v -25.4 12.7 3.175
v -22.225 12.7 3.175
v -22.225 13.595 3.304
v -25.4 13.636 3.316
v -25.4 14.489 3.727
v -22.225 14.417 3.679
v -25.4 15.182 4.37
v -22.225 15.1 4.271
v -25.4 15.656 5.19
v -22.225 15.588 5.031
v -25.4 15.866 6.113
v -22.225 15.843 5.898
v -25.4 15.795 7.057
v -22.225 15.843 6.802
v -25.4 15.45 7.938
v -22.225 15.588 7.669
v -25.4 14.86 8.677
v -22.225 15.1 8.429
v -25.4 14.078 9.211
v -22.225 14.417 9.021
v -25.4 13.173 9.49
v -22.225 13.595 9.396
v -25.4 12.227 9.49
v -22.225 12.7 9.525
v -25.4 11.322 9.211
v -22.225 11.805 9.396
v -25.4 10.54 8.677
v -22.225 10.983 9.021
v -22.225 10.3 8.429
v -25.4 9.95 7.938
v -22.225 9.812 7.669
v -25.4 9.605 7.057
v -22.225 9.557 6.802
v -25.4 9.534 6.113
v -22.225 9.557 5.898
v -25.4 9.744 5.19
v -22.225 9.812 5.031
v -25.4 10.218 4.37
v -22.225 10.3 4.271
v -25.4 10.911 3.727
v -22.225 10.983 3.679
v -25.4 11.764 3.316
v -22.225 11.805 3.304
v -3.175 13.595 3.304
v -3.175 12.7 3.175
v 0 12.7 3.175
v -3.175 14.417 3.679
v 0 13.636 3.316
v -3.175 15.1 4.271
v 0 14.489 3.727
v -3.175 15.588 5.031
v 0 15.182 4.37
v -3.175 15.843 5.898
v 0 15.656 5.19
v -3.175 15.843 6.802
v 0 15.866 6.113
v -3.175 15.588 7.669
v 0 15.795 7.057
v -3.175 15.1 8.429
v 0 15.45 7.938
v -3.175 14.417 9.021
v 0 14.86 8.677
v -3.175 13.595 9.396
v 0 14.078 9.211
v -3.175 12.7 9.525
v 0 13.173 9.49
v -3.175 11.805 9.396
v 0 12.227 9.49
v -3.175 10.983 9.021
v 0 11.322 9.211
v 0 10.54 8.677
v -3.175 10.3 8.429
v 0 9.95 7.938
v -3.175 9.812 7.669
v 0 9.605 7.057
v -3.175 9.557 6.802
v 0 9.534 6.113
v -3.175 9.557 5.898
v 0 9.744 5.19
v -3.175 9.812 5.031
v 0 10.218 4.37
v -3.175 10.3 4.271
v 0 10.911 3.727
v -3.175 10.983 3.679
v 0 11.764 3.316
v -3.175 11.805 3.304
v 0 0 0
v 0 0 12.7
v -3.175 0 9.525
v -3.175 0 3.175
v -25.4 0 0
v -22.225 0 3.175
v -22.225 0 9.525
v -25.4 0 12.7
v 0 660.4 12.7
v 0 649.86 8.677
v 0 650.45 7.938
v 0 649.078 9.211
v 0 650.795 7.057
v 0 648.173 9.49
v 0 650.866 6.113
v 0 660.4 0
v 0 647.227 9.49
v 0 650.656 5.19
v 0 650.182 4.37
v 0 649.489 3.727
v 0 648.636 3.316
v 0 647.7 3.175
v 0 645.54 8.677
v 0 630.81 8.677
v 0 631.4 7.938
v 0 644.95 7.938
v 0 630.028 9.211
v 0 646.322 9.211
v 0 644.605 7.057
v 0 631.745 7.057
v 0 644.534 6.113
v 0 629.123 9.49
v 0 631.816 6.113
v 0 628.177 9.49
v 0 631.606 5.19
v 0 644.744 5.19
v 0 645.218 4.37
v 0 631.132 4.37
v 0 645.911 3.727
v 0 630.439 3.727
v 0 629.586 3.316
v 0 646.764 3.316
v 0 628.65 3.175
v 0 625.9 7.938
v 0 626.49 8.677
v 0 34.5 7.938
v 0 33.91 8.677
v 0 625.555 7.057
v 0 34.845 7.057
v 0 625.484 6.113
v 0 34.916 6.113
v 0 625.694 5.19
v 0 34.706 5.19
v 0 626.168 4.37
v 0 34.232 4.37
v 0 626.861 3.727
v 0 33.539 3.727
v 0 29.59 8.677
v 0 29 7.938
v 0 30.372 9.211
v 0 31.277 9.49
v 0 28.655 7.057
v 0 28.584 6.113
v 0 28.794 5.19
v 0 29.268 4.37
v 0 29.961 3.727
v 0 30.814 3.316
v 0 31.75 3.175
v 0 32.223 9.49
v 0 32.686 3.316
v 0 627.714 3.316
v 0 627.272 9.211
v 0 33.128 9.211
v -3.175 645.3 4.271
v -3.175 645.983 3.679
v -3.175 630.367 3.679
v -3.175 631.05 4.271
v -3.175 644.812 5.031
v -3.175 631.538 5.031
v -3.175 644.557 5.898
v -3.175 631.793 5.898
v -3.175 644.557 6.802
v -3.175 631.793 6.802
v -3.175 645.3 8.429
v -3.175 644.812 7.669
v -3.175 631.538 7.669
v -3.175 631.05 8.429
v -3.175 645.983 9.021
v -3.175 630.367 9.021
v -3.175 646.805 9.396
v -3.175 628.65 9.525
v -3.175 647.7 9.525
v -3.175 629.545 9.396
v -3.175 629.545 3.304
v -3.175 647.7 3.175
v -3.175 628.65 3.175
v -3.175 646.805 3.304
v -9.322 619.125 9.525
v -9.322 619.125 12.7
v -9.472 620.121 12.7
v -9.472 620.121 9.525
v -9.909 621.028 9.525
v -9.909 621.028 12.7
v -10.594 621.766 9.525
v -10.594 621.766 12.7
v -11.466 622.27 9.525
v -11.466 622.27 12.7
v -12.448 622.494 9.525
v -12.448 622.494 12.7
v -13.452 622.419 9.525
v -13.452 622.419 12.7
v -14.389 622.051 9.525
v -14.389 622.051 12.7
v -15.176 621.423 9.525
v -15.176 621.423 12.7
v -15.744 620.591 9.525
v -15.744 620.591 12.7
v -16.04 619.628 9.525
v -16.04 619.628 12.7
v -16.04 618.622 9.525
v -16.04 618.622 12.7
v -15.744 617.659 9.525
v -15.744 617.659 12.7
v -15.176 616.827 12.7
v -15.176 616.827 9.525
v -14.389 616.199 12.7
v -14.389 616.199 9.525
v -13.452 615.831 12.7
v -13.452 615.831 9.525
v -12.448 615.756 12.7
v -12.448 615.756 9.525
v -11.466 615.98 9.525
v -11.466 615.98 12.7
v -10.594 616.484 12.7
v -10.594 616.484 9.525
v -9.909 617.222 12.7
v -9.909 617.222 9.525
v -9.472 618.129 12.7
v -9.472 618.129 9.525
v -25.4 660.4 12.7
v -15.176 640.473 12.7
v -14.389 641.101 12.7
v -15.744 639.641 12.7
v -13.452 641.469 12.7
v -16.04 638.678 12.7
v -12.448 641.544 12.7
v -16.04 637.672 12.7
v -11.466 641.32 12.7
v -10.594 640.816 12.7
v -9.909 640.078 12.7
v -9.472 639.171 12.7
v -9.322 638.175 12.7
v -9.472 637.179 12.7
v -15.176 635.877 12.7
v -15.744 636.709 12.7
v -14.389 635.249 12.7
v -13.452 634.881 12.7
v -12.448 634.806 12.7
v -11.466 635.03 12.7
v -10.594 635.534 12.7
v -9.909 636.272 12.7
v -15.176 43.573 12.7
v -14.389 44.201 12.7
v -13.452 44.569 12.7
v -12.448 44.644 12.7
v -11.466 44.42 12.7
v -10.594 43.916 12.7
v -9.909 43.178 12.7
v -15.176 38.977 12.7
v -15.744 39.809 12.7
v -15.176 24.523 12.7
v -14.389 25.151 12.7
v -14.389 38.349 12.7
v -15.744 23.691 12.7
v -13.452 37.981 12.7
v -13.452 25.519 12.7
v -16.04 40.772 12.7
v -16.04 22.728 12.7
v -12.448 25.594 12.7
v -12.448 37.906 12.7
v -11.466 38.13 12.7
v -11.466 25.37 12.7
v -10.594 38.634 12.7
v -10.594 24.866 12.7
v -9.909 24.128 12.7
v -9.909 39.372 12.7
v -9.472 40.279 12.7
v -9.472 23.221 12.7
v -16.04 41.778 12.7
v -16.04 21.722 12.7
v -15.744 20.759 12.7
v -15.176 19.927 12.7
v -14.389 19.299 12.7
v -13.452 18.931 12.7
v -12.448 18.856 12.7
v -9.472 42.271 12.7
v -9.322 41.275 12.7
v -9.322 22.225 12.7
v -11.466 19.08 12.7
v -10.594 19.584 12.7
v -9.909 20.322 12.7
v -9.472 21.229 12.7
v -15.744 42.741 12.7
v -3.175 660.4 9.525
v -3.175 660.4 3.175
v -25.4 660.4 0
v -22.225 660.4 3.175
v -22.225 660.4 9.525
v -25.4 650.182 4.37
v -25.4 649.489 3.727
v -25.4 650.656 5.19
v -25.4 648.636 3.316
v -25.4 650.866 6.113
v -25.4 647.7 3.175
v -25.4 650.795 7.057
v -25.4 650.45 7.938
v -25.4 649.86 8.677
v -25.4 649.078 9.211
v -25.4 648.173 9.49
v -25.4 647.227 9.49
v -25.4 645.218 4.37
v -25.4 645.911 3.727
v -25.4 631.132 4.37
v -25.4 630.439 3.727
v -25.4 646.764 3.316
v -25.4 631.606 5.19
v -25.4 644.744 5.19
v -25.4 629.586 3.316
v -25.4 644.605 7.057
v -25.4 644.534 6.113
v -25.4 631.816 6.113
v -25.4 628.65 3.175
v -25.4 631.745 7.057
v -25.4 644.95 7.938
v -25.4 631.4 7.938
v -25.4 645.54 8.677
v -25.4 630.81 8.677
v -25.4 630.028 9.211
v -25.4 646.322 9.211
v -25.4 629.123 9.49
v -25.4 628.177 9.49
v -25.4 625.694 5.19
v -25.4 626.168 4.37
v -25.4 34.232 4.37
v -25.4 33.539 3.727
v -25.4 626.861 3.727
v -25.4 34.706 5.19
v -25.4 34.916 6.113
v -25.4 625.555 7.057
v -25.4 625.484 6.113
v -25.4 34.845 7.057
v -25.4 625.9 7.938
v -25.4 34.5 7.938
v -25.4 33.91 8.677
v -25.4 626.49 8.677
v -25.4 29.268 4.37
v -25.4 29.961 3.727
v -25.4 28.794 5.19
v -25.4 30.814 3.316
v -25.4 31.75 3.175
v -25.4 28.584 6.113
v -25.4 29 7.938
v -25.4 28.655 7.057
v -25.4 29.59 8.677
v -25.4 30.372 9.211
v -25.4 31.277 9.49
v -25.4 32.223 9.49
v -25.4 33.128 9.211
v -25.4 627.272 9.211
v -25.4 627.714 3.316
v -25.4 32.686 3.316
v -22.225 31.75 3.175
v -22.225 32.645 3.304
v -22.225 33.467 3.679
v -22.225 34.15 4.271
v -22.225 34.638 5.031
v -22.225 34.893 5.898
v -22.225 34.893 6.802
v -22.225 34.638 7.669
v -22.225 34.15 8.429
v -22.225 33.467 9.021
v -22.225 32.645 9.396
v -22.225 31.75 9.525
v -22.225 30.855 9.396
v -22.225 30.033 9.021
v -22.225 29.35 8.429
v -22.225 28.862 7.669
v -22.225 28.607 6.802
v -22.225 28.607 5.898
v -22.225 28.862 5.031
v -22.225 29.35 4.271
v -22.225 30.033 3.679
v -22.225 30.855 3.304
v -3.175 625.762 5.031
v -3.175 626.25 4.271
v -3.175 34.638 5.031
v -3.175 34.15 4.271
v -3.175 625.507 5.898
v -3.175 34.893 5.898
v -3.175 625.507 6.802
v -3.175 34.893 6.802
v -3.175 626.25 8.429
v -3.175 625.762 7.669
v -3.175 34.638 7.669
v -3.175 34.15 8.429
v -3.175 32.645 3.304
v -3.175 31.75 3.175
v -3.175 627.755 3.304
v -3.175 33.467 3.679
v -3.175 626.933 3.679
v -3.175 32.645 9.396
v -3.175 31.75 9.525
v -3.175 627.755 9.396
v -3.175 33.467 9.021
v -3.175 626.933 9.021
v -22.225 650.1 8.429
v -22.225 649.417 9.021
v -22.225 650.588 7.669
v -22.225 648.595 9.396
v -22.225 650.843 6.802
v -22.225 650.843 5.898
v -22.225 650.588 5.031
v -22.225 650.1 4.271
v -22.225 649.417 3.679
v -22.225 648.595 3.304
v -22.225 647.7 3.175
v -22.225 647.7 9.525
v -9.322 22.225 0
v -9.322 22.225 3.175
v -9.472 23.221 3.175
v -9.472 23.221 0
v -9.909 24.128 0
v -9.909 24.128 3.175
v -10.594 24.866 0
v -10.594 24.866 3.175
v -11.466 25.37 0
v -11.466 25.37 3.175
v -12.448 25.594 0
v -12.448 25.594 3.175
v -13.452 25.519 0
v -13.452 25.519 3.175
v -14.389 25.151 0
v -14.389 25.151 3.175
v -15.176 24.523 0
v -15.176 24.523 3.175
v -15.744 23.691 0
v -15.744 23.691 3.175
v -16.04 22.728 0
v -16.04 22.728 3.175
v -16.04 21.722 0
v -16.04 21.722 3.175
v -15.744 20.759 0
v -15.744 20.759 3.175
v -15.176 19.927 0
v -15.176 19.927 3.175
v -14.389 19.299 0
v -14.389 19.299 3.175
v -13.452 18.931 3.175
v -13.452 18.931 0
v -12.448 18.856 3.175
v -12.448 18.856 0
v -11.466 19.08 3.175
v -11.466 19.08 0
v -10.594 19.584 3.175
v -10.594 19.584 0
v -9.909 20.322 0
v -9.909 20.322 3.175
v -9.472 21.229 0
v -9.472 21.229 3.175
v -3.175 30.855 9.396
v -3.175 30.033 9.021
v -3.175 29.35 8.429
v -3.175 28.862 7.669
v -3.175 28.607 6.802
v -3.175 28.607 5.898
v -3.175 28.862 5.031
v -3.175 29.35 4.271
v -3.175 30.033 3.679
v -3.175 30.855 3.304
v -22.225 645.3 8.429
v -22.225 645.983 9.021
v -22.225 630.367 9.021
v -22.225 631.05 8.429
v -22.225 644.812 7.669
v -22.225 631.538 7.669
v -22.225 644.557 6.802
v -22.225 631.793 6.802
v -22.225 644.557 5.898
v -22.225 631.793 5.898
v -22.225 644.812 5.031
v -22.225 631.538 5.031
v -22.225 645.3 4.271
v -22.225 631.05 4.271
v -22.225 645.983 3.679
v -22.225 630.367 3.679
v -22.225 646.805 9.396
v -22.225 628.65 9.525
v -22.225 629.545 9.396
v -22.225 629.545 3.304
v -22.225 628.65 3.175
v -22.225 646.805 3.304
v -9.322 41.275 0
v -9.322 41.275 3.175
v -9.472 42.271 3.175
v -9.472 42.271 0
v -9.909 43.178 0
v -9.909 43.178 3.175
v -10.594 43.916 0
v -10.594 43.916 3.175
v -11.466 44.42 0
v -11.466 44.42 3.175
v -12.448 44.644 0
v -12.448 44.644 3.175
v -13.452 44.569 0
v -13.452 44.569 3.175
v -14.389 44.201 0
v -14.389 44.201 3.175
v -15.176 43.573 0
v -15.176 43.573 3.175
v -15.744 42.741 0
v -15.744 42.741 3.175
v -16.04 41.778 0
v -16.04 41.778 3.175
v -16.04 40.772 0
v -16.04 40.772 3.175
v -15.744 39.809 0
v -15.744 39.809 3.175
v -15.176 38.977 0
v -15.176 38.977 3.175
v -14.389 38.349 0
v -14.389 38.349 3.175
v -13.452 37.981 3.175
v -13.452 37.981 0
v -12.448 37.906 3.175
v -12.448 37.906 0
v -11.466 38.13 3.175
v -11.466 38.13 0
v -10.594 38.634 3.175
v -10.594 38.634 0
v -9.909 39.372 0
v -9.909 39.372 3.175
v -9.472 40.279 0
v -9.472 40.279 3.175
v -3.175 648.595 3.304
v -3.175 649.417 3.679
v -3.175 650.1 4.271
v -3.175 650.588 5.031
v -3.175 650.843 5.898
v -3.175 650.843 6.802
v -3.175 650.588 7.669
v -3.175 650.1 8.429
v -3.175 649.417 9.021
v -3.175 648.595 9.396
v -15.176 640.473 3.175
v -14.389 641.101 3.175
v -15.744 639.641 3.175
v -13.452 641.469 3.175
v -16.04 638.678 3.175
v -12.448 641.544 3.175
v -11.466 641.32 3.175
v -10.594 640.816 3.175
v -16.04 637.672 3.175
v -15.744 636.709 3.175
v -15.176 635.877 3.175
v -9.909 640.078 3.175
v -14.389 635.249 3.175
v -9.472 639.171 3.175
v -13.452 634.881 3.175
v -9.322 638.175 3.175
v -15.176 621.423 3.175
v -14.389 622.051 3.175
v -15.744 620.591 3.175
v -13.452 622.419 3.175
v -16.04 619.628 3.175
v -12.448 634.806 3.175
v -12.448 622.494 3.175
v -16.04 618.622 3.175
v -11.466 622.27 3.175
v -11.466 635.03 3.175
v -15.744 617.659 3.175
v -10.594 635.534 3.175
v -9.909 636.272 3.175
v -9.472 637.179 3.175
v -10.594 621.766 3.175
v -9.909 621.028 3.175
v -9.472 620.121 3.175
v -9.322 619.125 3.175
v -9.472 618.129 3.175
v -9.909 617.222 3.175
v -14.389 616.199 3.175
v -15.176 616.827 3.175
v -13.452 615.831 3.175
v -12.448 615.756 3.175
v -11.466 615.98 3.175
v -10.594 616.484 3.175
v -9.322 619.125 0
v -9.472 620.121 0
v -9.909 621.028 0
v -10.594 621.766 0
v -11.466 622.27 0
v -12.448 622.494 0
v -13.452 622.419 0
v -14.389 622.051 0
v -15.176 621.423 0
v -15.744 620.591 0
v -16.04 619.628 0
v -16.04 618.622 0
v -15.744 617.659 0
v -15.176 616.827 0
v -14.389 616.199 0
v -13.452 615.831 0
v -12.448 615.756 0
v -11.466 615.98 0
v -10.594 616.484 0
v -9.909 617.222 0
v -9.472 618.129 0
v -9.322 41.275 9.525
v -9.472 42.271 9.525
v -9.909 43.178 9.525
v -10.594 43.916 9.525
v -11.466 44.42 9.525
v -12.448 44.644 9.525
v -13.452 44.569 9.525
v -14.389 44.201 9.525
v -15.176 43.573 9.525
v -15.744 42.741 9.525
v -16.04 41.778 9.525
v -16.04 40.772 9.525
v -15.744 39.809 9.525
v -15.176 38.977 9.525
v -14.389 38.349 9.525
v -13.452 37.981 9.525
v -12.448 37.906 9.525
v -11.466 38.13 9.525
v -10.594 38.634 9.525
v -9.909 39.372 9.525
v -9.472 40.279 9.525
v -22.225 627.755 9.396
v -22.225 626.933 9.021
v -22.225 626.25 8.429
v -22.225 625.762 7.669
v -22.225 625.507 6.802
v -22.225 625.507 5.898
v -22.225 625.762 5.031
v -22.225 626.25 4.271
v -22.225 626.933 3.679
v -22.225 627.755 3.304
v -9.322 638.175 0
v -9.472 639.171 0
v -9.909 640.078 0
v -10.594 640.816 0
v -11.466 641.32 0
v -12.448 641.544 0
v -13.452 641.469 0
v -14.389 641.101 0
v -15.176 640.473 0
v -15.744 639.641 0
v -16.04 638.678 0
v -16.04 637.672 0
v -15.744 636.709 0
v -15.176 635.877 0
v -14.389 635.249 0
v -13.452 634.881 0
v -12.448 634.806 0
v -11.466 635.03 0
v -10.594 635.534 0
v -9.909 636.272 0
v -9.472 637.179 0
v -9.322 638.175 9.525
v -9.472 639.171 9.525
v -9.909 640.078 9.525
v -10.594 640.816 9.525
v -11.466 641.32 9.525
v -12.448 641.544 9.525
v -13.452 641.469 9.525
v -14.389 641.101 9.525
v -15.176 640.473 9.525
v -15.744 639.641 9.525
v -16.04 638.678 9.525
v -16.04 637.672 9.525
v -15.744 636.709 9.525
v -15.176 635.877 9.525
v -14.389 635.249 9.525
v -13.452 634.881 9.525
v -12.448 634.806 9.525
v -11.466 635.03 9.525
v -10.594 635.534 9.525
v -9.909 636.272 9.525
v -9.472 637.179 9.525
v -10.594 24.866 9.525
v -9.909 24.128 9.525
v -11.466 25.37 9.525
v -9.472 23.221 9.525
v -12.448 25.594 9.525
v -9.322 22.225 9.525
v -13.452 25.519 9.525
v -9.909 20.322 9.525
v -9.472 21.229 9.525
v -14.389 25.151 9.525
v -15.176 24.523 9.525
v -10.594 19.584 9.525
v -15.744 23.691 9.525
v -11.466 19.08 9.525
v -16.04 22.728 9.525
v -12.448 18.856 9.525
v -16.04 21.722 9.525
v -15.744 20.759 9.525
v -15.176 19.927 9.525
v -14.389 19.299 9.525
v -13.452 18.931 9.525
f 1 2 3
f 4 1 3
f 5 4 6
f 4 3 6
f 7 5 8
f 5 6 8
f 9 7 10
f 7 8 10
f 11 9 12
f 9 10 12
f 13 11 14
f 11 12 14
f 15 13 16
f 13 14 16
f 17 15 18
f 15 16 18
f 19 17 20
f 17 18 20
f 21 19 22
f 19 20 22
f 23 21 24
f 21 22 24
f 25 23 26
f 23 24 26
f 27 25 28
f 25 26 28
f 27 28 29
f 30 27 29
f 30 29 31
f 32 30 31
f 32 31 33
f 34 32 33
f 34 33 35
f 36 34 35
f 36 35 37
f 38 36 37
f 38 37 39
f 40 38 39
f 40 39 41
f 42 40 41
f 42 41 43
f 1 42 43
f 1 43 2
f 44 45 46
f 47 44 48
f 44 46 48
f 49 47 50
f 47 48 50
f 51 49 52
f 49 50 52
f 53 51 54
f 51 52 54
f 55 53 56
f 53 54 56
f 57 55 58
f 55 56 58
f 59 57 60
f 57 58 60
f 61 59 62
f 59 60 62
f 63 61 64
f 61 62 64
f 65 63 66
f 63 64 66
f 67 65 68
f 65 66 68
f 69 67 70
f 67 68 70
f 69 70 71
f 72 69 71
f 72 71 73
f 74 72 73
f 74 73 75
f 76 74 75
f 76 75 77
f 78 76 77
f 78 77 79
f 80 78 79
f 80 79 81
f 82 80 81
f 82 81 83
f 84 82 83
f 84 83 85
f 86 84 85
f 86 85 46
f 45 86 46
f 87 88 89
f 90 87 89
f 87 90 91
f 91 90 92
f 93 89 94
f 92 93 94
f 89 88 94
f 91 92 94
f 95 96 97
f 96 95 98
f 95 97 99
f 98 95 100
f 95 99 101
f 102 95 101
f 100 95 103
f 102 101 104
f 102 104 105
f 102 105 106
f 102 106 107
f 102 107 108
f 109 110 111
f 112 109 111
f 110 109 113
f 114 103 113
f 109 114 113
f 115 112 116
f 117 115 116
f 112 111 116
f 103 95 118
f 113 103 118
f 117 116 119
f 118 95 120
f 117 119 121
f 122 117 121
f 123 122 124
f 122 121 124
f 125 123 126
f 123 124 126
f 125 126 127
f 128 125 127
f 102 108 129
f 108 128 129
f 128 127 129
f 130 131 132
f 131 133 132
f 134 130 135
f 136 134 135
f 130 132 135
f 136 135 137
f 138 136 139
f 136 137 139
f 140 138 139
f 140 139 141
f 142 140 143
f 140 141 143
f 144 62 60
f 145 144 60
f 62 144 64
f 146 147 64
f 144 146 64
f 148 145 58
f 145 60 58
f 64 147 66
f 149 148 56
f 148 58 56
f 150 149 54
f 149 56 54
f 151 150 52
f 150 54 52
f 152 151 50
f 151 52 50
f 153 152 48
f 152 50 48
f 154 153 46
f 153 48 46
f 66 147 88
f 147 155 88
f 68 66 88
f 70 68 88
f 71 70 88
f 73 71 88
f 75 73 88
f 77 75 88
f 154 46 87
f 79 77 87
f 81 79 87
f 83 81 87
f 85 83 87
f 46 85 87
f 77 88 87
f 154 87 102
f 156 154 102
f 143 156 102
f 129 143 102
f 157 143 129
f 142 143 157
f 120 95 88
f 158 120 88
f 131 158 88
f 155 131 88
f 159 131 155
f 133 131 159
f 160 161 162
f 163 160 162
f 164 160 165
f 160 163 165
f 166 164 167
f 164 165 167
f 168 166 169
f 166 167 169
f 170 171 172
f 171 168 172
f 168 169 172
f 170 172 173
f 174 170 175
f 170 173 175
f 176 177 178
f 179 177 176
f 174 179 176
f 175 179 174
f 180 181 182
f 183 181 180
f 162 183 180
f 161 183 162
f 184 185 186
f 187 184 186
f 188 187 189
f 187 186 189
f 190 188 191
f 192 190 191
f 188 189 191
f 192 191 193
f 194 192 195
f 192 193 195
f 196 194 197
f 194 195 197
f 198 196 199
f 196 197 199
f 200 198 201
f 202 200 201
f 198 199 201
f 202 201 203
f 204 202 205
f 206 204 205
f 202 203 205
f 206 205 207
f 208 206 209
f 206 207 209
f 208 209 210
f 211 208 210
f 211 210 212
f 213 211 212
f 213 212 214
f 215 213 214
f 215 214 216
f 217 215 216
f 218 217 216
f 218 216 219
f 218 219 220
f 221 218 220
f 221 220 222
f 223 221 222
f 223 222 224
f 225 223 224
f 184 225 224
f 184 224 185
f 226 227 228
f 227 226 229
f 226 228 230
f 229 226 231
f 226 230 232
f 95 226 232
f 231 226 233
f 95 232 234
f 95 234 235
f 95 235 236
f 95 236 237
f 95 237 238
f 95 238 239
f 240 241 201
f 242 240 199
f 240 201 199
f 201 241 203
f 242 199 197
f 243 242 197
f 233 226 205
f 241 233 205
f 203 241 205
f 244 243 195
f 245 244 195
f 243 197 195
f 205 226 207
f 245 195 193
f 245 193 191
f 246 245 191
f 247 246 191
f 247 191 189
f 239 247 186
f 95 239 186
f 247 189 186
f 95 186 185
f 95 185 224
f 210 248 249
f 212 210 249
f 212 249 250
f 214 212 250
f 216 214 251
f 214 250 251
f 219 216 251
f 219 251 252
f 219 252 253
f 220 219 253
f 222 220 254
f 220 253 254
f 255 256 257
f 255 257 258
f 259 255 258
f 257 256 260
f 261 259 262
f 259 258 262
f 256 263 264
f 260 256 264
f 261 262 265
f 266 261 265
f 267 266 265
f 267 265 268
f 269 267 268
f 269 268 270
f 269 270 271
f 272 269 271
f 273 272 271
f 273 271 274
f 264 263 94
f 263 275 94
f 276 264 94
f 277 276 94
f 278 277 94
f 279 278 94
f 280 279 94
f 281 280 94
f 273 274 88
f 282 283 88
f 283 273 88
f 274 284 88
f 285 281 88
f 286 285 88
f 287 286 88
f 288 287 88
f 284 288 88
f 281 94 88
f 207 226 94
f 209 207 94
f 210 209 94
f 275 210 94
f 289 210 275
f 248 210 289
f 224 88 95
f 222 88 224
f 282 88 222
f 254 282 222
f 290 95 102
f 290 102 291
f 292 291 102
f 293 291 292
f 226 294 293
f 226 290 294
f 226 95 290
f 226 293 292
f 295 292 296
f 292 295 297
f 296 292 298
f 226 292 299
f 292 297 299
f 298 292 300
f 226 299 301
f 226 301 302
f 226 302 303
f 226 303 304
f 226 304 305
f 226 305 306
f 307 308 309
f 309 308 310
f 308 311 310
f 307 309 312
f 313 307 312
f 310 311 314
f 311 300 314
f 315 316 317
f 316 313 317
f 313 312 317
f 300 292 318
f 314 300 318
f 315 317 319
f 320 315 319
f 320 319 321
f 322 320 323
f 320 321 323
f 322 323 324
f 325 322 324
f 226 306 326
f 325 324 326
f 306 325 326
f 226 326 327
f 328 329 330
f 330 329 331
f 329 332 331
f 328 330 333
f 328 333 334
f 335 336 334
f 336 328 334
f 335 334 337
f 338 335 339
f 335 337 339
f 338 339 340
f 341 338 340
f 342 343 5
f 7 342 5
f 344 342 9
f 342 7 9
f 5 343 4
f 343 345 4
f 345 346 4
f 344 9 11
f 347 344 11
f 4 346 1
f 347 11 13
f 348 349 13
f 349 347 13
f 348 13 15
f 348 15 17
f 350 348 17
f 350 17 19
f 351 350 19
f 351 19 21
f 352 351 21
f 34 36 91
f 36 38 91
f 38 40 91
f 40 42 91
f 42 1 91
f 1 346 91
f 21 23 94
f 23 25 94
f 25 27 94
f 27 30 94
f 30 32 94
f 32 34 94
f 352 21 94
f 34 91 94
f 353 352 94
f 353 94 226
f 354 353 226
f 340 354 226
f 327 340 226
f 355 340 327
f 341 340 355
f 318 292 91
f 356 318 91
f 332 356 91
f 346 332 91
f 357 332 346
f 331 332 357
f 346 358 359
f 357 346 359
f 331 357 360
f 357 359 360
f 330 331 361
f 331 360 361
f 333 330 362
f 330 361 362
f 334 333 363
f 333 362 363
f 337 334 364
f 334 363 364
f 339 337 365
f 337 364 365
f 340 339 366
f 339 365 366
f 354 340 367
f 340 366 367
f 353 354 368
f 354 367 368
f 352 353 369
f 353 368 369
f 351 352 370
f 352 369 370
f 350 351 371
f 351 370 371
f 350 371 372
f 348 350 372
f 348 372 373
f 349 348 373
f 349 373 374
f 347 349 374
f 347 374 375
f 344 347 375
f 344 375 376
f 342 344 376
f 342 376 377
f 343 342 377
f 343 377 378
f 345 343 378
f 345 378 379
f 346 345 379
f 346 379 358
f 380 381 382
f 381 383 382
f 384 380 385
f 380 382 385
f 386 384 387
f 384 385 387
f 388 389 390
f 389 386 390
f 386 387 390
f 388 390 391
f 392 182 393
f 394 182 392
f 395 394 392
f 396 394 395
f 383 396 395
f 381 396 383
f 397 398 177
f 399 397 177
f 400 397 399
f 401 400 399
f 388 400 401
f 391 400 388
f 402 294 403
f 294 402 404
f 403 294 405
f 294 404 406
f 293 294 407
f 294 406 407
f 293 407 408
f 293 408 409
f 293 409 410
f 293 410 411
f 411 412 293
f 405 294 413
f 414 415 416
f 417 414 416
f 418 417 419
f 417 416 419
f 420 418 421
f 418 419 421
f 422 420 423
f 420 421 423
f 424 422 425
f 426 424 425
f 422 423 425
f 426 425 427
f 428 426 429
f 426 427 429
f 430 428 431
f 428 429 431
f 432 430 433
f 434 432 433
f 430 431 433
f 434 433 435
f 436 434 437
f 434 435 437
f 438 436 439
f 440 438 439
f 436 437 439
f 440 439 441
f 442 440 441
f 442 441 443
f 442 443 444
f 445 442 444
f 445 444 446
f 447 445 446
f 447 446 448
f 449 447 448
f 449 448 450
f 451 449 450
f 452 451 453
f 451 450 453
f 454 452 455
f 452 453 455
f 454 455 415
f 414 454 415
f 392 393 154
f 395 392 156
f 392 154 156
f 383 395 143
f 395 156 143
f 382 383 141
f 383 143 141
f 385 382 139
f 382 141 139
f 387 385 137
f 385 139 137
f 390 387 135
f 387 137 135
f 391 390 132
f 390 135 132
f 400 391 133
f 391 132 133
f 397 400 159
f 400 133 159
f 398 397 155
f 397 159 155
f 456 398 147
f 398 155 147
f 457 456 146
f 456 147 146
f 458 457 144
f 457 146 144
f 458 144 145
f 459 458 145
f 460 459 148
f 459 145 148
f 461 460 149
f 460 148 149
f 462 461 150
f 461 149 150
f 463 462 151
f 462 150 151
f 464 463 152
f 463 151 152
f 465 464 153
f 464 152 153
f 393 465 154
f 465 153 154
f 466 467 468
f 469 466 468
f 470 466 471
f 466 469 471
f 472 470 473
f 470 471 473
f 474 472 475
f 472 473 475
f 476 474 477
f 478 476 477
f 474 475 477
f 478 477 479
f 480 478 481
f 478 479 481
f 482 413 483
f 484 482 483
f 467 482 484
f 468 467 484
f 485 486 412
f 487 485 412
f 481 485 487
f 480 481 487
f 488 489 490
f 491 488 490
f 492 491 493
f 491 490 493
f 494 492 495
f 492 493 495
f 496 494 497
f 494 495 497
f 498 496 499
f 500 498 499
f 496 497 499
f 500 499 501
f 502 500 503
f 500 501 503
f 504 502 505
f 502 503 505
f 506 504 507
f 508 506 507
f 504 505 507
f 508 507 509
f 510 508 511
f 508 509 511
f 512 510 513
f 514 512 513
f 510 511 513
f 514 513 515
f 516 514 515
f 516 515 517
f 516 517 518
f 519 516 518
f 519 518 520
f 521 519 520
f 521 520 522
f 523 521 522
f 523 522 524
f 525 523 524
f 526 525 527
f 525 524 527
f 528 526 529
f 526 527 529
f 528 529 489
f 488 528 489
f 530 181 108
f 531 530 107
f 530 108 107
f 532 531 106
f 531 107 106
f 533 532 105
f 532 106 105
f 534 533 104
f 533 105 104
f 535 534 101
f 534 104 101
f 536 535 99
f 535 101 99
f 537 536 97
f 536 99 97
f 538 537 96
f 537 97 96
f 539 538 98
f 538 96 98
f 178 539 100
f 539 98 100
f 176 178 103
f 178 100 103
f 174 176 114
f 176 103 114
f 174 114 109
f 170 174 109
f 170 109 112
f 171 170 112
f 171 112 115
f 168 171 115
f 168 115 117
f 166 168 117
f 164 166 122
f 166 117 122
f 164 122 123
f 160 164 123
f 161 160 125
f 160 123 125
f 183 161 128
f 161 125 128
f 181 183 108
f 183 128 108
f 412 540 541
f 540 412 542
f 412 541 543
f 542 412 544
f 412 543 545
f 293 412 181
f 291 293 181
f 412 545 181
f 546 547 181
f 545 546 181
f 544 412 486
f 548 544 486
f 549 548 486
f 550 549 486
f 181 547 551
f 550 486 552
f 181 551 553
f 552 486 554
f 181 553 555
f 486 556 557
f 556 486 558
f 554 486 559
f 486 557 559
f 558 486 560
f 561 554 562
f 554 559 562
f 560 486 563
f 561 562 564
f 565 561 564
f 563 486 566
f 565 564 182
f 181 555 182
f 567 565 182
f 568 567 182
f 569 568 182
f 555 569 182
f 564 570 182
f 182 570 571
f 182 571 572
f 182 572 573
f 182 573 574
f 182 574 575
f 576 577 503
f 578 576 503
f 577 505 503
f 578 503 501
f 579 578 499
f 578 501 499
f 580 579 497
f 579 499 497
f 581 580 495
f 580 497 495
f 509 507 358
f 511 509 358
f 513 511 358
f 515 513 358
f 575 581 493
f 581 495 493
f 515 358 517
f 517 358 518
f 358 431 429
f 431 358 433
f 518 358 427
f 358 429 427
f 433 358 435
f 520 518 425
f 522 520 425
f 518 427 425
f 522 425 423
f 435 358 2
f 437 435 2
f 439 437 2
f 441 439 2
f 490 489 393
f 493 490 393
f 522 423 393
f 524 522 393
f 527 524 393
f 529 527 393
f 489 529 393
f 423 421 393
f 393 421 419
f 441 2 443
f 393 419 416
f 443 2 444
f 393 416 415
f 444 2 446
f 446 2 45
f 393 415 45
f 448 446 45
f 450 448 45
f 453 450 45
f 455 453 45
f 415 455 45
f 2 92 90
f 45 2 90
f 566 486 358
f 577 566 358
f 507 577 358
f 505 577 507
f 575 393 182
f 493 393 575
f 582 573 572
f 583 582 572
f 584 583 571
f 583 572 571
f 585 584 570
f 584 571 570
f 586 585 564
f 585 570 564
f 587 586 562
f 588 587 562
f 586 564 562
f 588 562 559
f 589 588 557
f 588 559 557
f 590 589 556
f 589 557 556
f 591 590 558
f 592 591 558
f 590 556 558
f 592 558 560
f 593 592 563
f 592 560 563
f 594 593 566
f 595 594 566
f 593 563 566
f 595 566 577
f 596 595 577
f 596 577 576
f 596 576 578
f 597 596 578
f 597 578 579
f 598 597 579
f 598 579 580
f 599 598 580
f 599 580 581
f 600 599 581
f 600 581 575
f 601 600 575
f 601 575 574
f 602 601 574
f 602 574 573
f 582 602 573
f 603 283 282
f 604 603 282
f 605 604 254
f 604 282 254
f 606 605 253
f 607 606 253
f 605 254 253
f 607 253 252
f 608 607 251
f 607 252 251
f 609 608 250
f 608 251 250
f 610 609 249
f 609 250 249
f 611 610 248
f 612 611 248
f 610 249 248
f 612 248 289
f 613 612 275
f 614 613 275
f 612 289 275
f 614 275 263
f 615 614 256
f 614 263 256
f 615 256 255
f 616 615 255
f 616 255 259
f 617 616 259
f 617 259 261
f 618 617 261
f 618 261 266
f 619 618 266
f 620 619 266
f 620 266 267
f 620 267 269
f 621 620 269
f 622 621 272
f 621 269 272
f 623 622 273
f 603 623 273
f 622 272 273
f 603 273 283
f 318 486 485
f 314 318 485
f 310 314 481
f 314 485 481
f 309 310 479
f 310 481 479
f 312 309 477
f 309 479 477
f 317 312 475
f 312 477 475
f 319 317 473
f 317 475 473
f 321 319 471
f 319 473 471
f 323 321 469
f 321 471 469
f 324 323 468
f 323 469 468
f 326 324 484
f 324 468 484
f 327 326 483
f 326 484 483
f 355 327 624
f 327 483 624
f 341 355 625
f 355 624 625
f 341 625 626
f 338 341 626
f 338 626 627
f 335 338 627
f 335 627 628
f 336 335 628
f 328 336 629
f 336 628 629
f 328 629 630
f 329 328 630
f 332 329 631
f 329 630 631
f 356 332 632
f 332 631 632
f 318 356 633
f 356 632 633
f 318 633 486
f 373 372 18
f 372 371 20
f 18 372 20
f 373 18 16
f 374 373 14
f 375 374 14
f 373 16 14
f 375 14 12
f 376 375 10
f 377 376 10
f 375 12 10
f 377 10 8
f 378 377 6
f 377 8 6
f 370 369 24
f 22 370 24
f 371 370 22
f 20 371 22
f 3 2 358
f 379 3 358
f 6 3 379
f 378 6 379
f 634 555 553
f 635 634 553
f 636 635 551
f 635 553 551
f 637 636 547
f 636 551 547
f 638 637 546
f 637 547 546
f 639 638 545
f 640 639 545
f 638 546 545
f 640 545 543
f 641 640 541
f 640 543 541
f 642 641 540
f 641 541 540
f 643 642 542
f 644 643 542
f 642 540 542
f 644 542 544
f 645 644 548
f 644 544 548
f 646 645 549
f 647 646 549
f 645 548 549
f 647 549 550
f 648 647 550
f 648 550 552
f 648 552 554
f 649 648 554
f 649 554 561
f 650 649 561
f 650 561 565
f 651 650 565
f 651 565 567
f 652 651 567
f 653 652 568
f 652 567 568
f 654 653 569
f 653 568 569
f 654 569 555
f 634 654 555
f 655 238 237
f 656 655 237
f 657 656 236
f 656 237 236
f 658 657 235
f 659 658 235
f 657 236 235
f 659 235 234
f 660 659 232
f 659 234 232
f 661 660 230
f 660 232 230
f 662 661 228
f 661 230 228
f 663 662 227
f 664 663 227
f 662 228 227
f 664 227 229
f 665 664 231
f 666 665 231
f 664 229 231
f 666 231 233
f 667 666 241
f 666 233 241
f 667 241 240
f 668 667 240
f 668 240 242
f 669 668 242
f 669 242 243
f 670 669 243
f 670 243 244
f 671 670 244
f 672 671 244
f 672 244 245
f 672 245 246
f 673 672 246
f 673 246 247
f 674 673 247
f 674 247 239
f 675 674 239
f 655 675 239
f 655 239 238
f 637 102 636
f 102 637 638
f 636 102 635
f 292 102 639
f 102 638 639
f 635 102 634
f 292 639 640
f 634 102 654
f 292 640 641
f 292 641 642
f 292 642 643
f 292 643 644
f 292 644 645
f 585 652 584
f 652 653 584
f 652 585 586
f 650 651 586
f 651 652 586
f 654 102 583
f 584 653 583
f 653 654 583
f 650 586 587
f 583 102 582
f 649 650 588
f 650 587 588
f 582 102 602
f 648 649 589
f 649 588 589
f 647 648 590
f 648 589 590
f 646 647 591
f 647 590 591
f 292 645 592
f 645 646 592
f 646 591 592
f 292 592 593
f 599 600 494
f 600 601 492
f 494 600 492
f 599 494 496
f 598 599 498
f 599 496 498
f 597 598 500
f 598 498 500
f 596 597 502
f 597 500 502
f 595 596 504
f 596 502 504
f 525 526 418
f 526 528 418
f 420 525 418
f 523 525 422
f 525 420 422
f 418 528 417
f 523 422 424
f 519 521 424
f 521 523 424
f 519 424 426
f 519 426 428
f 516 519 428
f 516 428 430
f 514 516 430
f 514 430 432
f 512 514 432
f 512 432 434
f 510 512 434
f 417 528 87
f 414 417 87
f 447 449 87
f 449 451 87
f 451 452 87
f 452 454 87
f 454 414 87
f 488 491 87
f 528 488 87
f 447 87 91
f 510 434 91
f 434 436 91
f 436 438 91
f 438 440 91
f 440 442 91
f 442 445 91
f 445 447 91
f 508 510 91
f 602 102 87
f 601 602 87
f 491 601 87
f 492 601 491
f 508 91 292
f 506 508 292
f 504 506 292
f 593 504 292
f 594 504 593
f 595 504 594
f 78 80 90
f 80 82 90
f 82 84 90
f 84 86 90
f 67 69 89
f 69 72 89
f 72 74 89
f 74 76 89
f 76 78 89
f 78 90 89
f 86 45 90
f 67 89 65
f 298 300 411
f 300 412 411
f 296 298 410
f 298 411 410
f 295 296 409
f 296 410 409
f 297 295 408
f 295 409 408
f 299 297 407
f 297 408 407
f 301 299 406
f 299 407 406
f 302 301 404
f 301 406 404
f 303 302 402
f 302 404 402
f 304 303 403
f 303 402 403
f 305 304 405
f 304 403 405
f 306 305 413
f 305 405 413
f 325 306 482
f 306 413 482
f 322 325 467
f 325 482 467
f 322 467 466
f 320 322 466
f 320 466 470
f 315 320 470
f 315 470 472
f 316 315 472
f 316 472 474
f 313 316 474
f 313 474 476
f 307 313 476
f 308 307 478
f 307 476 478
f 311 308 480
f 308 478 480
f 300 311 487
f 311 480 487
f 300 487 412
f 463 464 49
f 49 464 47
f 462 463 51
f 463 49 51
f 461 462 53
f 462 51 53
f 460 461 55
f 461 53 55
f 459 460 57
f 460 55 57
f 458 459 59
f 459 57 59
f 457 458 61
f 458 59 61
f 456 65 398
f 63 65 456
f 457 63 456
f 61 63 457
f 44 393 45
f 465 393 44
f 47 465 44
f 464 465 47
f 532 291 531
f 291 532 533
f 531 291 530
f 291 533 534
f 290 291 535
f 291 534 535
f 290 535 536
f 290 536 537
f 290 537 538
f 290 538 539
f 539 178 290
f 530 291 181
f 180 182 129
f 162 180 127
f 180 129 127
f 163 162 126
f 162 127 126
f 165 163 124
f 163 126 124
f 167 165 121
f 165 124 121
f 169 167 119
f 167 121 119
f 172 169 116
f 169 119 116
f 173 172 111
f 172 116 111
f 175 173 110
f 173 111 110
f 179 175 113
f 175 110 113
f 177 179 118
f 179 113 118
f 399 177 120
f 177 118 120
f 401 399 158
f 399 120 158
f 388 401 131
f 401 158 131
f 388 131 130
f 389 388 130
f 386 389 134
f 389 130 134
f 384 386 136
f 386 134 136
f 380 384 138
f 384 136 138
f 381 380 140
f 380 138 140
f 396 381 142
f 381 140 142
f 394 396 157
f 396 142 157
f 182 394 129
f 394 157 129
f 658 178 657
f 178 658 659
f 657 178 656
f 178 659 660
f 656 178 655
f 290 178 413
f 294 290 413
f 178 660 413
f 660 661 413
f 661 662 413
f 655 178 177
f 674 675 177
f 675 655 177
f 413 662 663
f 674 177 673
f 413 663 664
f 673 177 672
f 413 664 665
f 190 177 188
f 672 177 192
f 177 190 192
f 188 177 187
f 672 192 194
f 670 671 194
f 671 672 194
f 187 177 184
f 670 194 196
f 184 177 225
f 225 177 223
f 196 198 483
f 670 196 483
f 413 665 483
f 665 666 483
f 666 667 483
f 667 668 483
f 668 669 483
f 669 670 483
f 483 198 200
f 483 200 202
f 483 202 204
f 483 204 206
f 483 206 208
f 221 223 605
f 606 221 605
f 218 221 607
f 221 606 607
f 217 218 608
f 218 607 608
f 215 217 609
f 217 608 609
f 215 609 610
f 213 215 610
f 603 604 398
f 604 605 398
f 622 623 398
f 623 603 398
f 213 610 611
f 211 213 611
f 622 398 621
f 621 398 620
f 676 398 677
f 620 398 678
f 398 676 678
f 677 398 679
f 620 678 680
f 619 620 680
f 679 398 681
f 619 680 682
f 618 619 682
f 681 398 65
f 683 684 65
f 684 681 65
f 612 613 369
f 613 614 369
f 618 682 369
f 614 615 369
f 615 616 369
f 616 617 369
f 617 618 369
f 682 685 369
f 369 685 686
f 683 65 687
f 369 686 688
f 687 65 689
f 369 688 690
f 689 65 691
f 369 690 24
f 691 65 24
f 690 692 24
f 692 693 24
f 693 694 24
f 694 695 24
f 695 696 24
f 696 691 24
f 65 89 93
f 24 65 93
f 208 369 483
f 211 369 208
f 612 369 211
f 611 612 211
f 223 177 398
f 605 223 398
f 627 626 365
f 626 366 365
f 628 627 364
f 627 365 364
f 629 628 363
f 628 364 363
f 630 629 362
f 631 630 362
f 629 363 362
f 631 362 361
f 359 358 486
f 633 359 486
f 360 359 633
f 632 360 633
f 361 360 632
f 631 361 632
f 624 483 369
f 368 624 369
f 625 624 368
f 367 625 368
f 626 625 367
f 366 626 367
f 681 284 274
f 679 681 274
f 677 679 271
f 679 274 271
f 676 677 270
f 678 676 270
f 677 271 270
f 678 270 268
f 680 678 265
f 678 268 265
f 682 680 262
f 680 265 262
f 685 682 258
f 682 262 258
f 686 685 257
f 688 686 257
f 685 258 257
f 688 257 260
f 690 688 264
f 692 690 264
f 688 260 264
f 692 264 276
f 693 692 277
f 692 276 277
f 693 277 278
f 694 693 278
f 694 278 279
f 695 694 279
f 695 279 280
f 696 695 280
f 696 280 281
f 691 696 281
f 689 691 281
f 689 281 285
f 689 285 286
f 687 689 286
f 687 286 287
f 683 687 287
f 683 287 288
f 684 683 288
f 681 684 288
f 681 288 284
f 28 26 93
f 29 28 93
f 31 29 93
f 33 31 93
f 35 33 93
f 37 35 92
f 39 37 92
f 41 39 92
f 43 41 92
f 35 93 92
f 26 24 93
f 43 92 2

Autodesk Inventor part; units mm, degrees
ref_plane "YZ Plane" through (0, 0, 0) normal (1, 0, 0) x (0, 1, 0)
ref_plane "XZ Plane" through (0, 0, 0) normal (0, 1, 0) x (-1, 0, 0)
sketch "Sketch1" plane through (0, 0, 0) normal (0, 1, 0) x (-1, 0, 0)
  line L0 (0, 0) -> (25.4, 0)
  line L1 (25.4, 0) -> (25.4, 12.7)
  line L2 (25.4, 12.7) -> (0, 12.7)
  line L3 (0, 12.7) -> (0, 0)
  line L4 (3.175, 9.525) -> (22.225, 9.525)
  line L5 (22.225, 9.525) -> (22.225, 3.175)
  line L6 (22.225, 3.175) -> (3.175, 3.175)
  line L7 (3.175, 3.175) -> (3.175, 9.525)
  dimension "d0" = 25.4
  dimension "d2" = 3.175
  dimension "d5" = 12.7
extrude "Extrusion1" add sketch "Sketch1" along normal blind 660.4
sketch "Sketch2" plane through (-25.4, 0, 12.7) normal (0, 0, 1) x (1, 0, 0)
  circle A0 centre (12.7, 41.275) radius 3.3782 projected
  circle A1 centre (12.7, 22.225) radius 3.3782 projected
  circle A2 centre (12.7, 619.125) radius 3.3782 projected
  circle A3 centre (12.7, 638.175) radius 3.3782 projected
  line L0 (25.4, 0) -> (0, 0) projected
  line L1 (25.4, 660.4) -> (25.4, 0) projected
  line L2 (0, 660.4) -> (25.4, 660.4) projected
  line L3 (0, 0) -> (0, 660.4) projected
extrude "Extrusion2" cut sketch "Sketch2" against normal blind 25.4 contours A0 | A1 | A2 | A3
ref_plane "Work Plane1" through (-25.4, 0, 6.35) normal (0, 0, 1) x (1, 0, 0)
sketch "Sketch3" plane through (0, 0, 0) normal (1, 0, 0) x (0, 0, -1)
  line L0 (-12.7, 0) -> (0, 0) projected
  line L1 (-12.7, 660.4) -> (0, 660.4) projected
  line L2 (-6.35, 0) -> (-6.35, 660.4) construction
  circle A0 centre (-6.35, 647.7) radius 3.175
  circle A1 centre (-6.35, 628.65) radius 3.175
  circle A2 centre (-6.35, 12.7) radius 3.175
  circle A3 centre (-6.35, 31.75) radius 3.175
  dimension "d8" = 6.35
  dimension "d10" = 12.7
  dimension "d11" = 19.05
  dimension "d12" = 12.7
  dimension "d13" = 19.05
extrude "Extrusion3" cut sketch "Sketch3" against normal blind 25.4
properties part number "M - 26 inch rail" material "Aluminum 6061"
